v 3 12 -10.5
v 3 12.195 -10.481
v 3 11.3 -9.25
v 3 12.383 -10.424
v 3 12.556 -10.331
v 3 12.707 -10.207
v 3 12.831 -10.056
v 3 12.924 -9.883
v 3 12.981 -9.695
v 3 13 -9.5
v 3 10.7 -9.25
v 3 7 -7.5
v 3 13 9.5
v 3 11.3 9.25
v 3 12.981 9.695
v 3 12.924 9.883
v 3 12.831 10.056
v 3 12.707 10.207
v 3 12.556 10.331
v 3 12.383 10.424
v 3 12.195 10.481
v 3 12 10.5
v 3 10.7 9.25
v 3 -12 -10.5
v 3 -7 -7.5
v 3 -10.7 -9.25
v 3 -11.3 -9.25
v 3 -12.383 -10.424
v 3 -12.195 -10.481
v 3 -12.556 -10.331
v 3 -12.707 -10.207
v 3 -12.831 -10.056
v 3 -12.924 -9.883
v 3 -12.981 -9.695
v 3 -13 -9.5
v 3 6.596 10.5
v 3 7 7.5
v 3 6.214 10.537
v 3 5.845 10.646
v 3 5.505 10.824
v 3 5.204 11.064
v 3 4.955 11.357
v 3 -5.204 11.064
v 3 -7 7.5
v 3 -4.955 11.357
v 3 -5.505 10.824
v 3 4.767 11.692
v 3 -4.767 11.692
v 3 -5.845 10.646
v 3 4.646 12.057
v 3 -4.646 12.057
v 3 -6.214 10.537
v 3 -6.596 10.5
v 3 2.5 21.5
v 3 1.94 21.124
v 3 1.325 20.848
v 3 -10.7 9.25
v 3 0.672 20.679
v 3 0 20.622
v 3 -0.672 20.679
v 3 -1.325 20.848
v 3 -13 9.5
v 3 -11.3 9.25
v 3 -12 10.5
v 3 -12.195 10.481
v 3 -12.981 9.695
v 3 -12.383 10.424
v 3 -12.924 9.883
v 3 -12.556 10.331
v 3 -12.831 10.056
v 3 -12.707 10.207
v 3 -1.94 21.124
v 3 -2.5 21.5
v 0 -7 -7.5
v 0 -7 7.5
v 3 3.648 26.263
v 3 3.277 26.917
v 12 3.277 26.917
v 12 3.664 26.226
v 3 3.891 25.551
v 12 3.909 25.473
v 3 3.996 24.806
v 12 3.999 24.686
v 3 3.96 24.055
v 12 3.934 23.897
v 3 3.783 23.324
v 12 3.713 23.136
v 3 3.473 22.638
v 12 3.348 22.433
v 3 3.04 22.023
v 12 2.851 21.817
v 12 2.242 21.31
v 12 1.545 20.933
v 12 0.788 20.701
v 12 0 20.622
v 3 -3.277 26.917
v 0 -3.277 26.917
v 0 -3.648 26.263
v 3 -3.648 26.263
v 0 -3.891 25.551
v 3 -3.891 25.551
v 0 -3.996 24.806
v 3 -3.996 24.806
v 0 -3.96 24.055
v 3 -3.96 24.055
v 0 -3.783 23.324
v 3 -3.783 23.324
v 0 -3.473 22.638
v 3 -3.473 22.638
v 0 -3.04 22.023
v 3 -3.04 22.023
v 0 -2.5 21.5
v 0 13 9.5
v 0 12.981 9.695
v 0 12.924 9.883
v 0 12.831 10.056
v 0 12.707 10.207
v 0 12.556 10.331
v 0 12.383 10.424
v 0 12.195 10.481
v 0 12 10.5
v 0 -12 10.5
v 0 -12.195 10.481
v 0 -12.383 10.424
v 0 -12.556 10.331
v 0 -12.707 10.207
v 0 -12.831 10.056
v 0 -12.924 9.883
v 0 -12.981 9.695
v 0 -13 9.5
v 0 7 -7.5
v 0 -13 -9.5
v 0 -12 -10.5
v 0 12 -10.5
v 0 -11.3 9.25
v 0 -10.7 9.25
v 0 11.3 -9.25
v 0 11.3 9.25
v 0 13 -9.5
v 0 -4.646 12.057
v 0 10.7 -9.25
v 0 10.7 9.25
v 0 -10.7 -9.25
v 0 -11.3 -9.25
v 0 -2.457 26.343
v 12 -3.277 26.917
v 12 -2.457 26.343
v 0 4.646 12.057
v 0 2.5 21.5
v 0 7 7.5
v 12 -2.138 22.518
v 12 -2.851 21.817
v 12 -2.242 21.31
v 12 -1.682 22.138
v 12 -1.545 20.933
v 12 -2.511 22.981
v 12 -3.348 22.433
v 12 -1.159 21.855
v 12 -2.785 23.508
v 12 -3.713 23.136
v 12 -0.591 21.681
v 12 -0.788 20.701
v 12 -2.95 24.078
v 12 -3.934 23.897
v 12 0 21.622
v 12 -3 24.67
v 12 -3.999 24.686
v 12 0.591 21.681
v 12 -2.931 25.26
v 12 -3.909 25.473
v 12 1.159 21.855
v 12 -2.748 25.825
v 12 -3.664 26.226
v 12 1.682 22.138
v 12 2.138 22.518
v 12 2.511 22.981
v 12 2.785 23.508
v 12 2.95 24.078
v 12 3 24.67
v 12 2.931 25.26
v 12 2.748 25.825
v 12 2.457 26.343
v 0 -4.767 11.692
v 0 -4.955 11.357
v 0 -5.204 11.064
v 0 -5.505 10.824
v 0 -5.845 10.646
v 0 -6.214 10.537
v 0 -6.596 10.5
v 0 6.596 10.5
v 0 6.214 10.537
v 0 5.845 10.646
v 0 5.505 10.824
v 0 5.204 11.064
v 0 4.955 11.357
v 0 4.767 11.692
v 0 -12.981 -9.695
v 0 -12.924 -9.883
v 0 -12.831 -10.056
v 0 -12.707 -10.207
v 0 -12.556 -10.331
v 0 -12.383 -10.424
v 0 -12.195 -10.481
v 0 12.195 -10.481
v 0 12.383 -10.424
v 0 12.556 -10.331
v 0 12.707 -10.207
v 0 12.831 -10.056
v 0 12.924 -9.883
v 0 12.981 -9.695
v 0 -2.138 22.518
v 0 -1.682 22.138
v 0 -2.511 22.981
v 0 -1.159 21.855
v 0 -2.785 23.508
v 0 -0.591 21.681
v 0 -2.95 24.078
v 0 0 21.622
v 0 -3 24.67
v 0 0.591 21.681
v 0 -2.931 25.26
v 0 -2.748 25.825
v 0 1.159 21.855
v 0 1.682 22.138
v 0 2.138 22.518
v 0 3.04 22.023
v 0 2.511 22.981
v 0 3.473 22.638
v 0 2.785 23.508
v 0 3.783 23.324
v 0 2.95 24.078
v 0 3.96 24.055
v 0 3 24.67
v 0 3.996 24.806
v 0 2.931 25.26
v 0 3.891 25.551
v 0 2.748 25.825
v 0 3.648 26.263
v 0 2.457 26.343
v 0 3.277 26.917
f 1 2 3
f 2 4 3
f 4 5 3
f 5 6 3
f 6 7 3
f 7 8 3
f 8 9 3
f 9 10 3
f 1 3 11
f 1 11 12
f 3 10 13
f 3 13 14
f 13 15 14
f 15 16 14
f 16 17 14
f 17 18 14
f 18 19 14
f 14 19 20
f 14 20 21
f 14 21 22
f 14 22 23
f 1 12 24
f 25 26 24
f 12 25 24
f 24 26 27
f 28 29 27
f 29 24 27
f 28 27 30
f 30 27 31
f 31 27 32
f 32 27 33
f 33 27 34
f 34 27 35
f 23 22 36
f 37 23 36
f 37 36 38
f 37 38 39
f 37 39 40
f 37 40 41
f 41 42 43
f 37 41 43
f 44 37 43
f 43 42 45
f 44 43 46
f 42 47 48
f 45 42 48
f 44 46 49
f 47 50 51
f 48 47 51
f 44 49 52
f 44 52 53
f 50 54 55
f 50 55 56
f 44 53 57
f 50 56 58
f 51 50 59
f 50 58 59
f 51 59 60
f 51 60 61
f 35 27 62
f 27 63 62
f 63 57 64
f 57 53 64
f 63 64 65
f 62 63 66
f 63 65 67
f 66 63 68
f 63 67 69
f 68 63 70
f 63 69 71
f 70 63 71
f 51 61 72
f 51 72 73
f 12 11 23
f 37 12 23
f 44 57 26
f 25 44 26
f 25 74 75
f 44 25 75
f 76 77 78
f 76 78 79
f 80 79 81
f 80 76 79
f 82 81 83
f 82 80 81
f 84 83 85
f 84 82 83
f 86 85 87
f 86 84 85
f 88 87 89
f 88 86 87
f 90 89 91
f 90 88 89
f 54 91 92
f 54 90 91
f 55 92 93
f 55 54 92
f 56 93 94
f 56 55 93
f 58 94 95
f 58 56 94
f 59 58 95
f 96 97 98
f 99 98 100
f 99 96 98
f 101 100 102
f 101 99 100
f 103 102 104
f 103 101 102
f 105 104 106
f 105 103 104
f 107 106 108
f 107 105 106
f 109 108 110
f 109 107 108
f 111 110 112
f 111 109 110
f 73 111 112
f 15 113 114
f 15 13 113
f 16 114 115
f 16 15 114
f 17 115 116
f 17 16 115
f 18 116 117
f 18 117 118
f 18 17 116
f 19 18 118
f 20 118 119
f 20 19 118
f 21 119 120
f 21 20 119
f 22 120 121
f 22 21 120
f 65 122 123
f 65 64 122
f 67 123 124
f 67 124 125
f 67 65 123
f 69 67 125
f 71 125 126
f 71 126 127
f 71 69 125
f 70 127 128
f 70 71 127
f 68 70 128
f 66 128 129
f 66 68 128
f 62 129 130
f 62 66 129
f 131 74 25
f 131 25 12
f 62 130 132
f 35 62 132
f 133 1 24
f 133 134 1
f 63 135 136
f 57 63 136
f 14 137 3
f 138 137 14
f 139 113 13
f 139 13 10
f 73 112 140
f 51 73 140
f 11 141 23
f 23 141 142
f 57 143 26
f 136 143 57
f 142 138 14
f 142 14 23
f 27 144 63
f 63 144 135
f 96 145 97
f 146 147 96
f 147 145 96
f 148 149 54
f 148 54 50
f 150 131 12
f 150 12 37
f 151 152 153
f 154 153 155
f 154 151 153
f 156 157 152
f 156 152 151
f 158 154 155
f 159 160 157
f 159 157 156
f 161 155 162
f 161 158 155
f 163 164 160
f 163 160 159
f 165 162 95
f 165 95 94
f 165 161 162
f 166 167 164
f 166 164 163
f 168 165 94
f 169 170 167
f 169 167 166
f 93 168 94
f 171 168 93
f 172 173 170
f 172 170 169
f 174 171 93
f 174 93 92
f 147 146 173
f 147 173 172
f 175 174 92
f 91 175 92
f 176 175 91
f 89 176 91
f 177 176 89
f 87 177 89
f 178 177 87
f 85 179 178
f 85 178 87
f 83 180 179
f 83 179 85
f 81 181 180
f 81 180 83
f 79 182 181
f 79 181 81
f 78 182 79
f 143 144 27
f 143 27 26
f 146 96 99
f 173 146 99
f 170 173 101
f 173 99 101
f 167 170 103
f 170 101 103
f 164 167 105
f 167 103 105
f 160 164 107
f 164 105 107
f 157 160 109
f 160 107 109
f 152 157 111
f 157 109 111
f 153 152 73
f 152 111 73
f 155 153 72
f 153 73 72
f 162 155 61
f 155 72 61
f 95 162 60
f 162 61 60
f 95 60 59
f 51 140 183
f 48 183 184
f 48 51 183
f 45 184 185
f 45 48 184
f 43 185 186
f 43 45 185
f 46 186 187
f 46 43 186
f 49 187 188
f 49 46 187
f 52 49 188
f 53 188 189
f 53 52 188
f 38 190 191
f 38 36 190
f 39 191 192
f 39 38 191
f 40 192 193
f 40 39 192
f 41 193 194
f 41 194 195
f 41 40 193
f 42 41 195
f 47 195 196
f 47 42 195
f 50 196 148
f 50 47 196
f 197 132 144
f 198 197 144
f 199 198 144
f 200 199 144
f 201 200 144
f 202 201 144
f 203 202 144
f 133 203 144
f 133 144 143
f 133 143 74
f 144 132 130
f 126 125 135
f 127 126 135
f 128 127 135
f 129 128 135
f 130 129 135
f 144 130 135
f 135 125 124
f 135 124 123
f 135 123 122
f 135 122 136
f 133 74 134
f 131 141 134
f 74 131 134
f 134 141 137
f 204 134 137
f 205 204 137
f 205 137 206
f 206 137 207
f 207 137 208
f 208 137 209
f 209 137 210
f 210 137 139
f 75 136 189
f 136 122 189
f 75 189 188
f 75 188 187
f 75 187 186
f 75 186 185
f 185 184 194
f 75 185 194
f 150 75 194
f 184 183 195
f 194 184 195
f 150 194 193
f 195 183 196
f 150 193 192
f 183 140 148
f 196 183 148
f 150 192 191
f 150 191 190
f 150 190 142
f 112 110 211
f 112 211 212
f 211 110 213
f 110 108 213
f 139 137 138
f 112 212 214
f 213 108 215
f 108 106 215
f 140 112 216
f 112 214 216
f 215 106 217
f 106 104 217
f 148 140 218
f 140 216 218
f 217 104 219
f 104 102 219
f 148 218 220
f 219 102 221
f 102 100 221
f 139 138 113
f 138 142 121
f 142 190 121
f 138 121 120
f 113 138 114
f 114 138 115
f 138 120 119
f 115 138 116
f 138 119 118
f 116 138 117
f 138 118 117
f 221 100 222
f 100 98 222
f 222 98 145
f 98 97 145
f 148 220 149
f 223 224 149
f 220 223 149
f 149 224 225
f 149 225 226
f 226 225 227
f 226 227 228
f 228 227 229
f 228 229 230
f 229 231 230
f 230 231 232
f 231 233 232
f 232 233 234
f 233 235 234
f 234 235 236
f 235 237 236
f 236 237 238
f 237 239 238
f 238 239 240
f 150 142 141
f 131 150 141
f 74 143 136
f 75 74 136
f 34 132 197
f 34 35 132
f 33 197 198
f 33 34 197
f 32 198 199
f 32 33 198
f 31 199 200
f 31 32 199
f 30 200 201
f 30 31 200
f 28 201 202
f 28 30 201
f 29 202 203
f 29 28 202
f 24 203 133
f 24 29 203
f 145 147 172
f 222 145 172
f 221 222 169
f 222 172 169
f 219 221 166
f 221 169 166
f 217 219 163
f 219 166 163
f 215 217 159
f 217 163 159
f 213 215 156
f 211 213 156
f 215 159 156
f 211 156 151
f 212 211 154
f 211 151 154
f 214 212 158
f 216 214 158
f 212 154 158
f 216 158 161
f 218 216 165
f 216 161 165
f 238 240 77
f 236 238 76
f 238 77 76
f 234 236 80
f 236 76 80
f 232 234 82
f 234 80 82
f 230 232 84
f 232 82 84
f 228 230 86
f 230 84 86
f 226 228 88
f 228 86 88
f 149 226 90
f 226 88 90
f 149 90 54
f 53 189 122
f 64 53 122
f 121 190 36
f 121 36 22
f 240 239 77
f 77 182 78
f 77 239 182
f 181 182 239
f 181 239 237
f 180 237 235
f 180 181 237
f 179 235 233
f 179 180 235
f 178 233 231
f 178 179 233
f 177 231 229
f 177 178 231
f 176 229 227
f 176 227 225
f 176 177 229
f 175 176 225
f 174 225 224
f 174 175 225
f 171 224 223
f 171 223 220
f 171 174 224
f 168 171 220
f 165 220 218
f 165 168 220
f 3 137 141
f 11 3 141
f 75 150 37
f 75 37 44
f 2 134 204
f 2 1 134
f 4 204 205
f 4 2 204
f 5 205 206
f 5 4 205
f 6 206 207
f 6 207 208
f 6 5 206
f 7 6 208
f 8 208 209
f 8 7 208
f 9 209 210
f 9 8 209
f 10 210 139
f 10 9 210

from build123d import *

# Parameters (mm, degrees)
SKETCH001_W       = 0.6
SKETCH001_H       = 18.5
PAD001_DEPTH      = 3
PAD002_DEPTH      = 9
PAD002_DEPTH_BACK = 3
FILLET_R          = 1
FILLET001_R       = 2


with BuildPart() as part:
    # Sketch001 → Pad001 (new body)
    with BuildSketch(Plane.YZ):
        Polygon((-13, 10.5), (-13, -10.5), (0, -10.5), (0, -7.5), (-7, -7.5), (-7, 7.5), (0, 7.5), (0, 21.5), (-2.5, 21.5), (-5, 10.5), align=None)
        with Locations((-11, 0)):
            Rectangle(SKETCH001_W, SKETCH001_H, mode=Mode.SUBTRACT)
    extrude(amount=PAD001_DEPTH)

    # Sketch002 (on Face16 of Pad001) → Pad002 (join, two sides)
    with BuildSketch(Plane.YZ.offset(3)) as pad002_sk:
        with BuildLine():
            ThreePointArc((-2.457456, 26.343228), (-2.661032, 23.237253), (0, 21.622499))
            Line((0, 21.622499), (0, 20.622499))
            ThreePointArc((-3.276608, 26.916805), (-3.548043, 22.775505), (0, 20.622499))
            Line((-2.457456, 26.343228), (-3.276608, 26.916805))
        make_face()
    extrude(amount=PAD002_DEPTH)
    extrude(pad002_sk.sketch, amount=-PAD002_DEPTH_BACK)

    # Mirrored: part across XZ


with BuildPart() as part_1:
    add(part.part)
    add(part.part.mirror(Plane.XZ))

    # Fillet
    fillet_edges = [part_1.edges().sort_by_distance(p)[0] for p in [
        (1.5, 13, 10.5),
        (1.5, 13, -10.5),
        (1.5, -13, -10.5),
        (1.5, -13, 10.5),
    ]]
    fillet(fillet_edges, radius=FILLET_R)

    # Fillet001
    fillet001_edges = [part_1.edges().sort_by_distance(p)[0] for p in [
        (1.5, -5, 10.5),
        (1.5, 5, 10.5),
    ]]
    fillet(fillet001_edges, radius=FILLET001_R)


solid = part_1.part
